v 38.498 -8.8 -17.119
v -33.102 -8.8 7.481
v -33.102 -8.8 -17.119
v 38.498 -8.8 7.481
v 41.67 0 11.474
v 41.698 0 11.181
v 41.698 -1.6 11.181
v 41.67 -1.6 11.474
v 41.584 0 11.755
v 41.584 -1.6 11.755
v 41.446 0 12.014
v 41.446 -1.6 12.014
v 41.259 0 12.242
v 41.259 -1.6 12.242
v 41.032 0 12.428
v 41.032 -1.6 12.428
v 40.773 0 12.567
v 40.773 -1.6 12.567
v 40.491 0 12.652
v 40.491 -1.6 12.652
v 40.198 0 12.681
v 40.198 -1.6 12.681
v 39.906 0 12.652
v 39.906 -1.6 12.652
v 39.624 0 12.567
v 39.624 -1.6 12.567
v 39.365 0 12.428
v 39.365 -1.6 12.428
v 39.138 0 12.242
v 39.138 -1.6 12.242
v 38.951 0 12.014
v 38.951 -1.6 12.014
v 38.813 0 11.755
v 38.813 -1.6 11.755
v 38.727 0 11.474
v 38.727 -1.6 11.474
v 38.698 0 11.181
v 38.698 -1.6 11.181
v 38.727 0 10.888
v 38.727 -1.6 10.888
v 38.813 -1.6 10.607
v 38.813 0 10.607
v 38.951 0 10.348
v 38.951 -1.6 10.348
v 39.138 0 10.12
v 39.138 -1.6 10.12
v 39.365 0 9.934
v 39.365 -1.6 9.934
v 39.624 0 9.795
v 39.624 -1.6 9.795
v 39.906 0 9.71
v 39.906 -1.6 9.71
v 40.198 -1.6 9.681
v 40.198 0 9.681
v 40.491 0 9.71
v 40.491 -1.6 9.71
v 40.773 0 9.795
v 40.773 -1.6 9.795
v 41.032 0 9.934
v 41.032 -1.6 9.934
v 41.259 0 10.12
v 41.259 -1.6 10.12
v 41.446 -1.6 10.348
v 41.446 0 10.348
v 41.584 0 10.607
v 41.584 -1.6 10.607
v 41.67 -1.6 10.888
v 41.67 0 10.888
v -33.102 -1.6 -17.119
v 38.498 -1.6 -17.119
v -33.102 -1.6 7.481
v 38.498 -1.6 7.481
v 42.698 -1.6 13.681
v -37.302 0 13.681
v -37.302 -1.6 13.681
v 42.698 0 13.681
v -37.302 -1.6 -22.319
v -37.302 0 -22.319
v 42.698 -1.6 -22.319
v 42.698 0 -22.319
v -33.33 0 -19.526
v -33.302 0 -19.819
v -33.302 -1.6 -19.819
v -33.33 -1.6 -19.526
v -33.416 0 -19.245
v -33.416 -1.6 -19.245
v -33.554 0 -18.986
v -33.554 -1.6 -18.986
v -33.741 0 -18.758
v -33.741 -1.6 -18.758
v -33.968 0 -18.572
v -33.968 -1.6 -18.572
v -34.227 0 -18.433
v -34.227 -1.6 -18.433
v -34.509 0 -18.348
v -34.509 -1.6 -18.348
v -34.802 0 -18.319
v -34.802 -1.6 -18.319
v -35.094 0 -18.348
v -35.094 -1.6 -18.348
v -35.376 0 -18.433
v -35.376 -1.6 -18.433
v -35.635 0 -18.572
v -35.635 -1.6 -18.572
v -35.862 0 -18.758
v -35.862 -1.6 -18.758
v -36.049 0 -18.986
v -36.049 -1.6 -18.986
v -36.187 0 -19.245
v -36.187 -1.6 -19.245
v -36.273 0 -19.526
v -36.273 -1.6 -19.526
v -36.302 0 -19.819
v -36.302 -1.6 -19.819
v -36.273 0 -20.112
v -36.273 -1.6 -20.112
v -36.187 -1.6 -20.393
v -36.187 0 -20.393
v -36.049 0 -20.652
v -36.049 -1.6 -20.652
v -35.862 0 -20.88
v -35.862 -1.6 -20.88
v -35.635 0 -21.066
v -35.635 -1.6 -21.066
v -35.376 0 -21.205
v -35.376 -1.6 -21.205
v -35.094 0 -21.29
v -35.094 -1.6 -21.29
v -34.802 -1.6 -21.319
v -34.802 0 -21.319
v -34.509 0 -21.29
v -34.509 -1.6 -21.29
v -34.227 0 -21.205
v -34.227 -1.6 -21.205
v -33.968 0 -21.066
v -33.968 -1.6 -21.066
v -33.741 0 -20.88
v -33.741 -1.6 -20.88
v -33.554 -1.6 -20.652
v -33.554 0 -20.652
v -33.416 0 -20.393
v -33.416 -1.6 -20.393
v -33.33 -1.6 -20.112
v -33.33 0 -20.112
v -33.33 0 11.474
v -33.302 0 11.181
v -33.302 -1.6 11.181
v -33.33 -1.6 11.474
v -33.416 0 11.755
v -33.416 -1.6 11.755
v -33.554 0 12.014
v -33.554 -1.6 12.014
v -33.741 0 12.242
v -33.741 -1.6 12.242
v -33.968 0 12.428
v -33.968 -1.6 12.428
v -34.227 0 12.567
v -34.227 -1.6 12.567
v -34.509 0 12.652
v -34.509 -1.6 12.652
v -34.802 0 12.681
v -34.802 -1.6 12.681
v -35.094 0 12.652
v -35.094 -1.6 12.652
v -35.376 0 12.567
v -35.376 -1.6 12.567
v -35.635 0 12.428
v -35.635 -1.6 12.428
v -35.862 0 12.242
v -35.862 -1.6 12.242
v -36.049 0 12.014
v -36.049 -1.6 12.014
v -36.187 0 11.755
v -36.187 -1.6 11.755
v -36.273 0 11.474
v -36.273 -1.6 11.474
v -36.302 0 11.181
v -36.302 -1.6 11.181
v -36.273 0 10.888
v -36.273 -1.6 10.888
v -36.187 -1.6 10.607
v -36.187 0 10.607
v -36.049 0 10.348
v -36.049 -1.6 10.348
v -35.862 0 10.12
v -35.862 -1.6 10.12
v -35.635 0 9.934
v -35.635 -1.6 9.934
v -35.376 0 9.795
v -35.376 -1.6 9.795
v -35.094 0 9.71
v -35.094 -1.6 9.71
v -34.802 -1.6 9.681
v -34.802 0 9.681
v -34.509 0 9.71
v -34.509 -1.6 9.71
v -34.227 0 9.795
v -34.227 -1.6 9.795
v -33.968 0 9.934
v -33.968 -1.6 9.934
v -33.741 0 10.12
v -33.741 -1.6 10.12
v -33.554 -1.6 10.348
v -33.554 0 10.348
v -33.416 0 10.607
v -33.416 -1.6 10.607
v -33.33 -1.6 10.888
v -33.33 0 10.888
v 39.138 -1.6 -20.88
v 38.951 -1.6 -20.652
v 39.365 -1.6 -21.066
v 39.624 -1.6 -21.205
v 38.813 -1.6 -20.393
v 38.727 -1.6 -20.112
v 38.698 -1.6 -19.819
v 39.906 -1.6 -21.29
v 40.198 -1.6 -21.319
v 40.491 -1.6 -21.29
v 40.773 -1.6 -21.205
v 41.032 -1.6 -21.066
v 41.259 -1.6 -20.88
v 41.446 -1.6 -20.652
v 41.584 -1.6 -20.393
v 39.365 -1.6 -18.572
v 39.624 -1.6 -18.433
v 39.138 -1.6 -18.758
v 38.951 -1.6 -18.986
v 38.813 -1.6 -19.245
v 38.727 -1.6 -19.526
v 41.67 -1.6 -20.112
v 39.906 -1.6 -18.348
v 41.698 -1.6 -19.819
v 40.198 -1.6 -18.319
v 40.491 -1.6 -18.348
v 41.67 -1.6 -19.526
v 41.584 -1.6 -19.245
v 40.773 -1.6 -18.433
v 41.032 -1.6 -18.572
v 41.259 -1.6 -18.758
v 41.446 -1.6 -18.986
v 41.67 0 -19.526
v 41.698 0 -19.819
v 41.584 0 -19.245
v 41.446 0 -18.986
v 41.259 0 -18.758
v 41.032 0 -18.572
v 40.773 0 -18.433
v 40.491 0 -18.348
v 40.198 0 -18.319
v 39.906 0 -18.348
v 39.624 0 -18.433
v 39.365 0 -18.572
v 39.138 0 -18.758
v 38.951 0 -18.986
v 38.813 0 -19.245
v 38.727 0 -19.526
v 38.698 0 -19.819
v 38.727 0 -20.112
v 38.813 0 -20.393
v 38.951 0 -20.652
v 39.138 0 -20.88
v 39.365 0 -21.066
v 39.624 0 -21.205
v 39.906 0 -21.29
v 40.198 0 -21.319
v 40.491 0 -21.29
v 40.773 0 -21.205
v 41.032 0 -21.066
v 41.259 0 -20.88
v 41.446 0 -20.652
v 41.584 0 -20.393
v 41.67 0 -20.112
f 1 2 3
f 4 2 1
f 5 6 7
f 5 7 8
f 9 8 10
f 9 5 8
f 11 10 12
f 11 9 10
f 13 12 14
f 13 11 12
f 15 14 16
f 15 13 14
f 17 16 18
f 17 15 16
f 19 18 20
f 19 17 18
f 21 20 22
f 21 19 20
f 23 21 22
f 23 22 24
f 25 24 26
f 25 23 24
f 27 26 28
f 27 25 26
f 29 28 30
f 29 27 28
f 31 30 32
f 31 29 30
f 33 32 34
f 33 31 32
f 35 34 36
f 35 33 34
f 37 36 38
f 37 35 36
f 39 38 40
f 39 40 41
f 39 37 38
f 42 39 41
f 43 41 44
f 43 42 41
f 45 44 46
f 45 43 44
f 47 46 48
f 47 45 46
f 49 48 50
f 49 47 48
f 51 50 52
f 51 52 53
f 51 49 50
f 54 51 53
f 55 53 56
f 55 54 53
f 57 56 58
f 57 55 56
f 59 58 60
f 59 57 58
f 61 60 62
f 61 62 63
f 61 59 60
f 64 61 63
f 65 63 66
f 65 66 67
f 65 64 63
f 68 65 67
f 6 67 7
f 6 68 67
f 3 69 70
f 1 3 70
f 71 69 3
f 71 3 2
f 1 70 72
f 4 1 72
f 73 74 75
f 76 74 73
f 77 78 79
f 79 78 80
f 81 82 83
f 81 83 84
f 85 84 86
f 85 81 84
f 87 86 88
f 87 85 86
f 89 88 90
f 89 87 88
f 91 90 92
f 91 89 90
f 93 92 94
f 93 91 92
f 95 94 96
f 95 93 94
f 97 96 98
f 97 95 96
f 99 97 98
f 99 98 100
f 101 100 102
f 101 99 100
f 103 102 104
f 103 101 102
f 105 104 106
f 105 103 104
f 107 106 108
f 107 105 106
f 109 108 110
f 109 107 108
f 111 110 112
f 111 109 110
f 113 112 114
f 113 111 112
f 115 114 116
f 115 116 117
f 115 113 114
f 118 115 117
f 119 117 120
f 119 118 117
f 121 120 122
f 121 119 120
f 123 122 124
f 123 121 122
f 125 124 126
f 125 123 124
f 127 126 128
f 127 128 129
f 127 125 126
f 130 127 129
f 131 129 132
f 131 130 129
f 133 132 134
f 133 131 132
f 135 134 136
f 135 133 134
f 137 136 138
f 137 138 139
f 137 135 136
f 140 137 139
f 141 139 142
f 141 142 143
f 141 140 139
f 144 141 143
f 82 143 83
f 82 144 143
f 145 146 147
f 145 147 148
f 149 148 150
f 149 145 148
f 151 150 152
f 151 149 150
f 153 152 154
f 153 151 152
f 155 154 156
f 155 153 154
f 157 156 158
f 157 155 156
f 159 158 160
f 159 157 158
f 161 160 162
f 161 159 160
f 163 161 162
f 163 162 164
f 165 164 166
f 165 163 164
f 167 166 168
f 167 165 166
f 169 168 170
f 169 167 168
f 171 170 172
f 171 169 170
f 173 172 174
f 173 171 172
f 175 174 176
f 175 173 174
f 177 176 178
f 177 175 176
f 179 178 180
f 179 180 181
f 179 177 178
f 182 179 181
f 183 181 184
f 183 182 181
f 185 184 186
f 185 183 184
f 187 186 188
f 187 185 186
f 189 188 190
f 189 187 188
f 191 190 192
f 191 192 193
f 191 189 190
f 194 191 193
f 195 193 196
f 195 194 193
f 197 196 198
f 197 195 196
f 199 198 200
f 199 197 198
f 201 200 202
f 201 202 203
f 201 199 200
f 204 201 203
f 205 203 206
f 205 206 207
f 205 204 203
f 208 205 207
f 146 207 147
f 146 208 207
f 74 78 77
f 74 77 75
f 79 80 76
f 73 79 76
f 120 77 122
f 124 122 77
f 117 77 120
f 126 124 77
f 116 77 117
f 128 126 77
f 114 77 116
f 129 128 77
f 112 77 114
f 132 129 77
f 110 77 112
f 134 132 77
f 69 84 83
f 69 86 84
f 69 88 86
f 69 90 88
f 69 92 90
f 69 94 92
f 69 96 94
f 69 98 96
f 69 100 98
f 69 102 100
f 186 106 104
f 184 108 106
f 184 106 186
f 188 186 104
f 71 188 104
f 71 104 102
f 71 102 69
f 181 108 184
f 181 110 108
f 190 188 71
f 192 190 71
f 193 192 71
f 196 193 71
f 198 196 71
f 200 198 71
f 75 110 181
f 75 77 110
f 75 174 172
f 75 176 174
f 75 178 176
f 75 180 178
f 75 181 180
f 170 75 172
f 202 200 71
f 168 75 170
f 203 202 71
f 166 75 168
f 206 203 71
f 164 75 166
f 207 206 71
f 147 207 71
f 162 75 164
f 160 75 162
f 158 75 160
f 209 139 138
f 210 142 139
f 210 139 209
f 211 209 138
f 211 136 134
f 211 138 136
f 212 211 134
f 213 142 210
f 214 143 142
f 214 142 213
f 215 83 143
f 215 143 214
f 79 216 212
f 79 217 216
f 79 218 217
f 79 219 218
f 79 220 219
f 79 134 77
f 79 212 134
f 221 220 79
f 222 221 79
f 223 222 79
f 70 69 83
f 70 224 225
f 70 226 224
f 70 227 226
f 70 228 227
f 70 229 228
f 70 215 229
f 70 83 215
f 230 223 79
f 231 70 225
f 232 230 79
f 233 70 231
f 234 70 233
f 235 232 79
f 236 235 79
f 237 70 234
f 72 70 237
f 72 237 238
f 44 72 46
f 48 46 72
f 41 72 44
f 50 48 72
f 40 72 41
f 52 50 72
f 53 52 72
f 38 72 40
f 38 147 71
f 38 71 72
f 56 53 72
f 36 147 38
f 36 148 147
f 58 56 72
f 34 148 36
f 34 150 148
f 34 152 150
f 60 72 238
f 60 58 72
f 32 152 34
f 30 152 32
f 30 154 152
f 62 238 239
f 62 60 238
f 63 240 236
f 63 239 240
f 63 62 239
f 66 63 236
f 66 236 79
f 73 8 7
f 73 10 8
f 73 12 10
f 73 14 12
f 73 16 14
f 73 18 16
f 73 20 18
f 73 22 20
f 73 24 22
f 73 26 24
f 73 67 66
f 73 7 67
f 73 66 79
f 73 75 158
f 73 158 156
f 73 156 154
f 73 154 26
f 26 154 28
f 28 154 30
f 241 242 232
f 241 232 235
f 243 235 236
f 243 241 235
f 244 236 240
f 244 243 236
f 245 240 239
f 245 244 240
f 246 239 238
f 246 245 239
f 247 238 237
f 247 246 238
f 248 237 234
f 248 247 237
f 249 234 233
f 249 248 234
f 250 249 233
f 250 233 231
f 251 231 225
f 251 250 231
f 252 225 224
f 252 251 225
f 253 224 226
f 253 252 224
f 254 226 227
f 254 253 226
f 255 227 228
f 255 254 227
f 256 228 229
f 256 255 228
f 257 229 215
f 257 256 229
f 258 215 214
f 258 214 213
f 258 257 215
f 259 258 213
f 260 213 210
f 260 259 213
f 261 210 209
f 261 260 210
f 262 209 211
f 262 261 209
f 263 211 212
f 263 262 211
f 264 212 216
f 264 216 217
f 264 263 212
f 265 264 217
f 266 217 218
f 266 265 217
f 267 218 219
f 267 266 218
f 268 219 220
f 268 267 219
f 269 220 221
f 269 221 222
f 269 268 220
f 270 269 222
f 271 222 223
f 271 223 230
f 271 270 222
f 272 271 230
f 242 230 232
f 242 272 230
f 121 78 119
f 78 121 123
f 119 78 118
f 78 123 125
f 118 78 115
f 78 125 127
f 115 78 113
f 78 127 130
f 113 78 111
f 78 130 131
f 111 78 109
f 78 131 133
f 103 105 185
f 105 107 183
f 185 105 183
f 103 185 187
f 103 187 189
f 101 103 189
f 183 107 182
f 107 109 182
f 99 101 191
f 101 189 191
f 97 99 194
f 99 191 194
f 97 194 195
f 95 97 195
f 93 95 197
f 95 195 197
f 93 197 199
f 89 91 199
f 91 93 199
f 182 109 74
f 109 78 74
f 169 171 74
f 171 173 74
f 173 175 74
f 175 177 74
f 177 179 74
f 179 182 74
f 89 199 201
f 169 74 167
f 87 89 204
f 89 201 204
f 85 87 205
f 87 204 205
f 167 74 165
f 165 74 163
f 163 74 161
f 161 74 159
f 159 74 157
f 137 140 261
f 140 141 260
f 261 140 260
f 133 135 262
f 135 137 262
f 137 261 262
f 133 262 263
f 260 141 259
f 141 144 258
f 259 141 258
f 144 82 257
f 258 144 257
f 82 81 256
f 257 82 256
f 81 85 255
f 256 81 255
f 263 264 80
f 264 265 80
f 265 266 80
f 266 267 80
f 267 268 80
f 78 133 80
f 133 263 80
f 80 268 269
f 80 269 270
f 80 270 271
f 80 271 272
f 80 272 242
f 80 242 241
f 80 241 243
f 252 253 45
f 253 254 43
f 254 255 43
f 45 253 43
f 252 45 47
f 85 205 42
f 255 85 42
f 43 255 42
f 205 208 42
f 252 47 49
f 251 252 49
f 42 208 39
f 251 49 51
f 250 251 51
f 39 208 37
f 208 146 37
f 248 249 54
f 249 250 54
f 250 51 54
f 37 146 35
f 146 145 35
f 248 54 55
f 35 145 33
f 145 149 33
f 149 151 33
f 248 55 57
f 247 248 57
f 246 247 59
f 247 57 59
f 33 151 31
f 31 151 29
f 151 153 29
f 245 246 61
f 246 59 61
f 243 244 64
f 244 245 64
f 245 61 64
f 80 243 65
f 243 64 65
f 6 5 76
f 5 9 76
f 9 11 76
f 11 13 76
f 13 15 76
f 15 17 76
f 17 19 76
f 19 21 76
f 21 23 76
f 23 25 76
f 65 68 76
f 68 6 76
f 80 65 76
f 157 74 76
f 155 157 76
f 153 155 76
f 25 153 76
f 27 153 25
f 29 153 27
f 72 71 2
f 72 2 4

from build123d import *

# Parameters (mm, degrees)
F0_W     = 80
F0_H     = 36
F0_R     = 1.5
F1_DEPTH = 1.6
F2_W     = 71.6
F2_H     = 24.6
F3_DEPTH = 7.2
F4_W     = 65
F4_H     = 14
F5_DEPTH = 1


with BuildPart() as f1:
    # F0 (on Front) → F1 (new body)
    with BuildSketch(Plane.XZ):
        with Locations((2.698481, -4.318948)):
            Rectangle(F0_W, F0_H)
        with Locations((-34.801519, -19.818948)):
            Circle(F0_R, mode=Mode.SUBTRACT)
        with Locations((40.198481, -19.818948)):
            Circle(F0_R, mode=Mode.SUBTRACT)
        with Locations((-34.801519, 11.181052)):
            Circle(F0_R, mode=Mode.SUBTRACT)
        with Locations((40.198481, 11.181052)):
            Circle(F0_R, mode=Mode.SUBTRACT)
    extrude(amount=F1_DEPTH)

    # F2 (on face) → F3 (join)
    with BuildSketch(Plane.XZ.offset(1.6)):
        with Locations((2.698481, -4.818948)):
            Rectangle(F2_W, F2_H)
    extrude(amount=F3_DEPTH)

    # F4 (on face) → F5 (join)
    with BuildSketch(Plane.XZ.offset(8.8)):
        with Locations((2.748481, -5.466159)):
            Rectangle(F4_W, F4_H)
    extrude(amount=-F5_DEPTH)


solid = f1.part
